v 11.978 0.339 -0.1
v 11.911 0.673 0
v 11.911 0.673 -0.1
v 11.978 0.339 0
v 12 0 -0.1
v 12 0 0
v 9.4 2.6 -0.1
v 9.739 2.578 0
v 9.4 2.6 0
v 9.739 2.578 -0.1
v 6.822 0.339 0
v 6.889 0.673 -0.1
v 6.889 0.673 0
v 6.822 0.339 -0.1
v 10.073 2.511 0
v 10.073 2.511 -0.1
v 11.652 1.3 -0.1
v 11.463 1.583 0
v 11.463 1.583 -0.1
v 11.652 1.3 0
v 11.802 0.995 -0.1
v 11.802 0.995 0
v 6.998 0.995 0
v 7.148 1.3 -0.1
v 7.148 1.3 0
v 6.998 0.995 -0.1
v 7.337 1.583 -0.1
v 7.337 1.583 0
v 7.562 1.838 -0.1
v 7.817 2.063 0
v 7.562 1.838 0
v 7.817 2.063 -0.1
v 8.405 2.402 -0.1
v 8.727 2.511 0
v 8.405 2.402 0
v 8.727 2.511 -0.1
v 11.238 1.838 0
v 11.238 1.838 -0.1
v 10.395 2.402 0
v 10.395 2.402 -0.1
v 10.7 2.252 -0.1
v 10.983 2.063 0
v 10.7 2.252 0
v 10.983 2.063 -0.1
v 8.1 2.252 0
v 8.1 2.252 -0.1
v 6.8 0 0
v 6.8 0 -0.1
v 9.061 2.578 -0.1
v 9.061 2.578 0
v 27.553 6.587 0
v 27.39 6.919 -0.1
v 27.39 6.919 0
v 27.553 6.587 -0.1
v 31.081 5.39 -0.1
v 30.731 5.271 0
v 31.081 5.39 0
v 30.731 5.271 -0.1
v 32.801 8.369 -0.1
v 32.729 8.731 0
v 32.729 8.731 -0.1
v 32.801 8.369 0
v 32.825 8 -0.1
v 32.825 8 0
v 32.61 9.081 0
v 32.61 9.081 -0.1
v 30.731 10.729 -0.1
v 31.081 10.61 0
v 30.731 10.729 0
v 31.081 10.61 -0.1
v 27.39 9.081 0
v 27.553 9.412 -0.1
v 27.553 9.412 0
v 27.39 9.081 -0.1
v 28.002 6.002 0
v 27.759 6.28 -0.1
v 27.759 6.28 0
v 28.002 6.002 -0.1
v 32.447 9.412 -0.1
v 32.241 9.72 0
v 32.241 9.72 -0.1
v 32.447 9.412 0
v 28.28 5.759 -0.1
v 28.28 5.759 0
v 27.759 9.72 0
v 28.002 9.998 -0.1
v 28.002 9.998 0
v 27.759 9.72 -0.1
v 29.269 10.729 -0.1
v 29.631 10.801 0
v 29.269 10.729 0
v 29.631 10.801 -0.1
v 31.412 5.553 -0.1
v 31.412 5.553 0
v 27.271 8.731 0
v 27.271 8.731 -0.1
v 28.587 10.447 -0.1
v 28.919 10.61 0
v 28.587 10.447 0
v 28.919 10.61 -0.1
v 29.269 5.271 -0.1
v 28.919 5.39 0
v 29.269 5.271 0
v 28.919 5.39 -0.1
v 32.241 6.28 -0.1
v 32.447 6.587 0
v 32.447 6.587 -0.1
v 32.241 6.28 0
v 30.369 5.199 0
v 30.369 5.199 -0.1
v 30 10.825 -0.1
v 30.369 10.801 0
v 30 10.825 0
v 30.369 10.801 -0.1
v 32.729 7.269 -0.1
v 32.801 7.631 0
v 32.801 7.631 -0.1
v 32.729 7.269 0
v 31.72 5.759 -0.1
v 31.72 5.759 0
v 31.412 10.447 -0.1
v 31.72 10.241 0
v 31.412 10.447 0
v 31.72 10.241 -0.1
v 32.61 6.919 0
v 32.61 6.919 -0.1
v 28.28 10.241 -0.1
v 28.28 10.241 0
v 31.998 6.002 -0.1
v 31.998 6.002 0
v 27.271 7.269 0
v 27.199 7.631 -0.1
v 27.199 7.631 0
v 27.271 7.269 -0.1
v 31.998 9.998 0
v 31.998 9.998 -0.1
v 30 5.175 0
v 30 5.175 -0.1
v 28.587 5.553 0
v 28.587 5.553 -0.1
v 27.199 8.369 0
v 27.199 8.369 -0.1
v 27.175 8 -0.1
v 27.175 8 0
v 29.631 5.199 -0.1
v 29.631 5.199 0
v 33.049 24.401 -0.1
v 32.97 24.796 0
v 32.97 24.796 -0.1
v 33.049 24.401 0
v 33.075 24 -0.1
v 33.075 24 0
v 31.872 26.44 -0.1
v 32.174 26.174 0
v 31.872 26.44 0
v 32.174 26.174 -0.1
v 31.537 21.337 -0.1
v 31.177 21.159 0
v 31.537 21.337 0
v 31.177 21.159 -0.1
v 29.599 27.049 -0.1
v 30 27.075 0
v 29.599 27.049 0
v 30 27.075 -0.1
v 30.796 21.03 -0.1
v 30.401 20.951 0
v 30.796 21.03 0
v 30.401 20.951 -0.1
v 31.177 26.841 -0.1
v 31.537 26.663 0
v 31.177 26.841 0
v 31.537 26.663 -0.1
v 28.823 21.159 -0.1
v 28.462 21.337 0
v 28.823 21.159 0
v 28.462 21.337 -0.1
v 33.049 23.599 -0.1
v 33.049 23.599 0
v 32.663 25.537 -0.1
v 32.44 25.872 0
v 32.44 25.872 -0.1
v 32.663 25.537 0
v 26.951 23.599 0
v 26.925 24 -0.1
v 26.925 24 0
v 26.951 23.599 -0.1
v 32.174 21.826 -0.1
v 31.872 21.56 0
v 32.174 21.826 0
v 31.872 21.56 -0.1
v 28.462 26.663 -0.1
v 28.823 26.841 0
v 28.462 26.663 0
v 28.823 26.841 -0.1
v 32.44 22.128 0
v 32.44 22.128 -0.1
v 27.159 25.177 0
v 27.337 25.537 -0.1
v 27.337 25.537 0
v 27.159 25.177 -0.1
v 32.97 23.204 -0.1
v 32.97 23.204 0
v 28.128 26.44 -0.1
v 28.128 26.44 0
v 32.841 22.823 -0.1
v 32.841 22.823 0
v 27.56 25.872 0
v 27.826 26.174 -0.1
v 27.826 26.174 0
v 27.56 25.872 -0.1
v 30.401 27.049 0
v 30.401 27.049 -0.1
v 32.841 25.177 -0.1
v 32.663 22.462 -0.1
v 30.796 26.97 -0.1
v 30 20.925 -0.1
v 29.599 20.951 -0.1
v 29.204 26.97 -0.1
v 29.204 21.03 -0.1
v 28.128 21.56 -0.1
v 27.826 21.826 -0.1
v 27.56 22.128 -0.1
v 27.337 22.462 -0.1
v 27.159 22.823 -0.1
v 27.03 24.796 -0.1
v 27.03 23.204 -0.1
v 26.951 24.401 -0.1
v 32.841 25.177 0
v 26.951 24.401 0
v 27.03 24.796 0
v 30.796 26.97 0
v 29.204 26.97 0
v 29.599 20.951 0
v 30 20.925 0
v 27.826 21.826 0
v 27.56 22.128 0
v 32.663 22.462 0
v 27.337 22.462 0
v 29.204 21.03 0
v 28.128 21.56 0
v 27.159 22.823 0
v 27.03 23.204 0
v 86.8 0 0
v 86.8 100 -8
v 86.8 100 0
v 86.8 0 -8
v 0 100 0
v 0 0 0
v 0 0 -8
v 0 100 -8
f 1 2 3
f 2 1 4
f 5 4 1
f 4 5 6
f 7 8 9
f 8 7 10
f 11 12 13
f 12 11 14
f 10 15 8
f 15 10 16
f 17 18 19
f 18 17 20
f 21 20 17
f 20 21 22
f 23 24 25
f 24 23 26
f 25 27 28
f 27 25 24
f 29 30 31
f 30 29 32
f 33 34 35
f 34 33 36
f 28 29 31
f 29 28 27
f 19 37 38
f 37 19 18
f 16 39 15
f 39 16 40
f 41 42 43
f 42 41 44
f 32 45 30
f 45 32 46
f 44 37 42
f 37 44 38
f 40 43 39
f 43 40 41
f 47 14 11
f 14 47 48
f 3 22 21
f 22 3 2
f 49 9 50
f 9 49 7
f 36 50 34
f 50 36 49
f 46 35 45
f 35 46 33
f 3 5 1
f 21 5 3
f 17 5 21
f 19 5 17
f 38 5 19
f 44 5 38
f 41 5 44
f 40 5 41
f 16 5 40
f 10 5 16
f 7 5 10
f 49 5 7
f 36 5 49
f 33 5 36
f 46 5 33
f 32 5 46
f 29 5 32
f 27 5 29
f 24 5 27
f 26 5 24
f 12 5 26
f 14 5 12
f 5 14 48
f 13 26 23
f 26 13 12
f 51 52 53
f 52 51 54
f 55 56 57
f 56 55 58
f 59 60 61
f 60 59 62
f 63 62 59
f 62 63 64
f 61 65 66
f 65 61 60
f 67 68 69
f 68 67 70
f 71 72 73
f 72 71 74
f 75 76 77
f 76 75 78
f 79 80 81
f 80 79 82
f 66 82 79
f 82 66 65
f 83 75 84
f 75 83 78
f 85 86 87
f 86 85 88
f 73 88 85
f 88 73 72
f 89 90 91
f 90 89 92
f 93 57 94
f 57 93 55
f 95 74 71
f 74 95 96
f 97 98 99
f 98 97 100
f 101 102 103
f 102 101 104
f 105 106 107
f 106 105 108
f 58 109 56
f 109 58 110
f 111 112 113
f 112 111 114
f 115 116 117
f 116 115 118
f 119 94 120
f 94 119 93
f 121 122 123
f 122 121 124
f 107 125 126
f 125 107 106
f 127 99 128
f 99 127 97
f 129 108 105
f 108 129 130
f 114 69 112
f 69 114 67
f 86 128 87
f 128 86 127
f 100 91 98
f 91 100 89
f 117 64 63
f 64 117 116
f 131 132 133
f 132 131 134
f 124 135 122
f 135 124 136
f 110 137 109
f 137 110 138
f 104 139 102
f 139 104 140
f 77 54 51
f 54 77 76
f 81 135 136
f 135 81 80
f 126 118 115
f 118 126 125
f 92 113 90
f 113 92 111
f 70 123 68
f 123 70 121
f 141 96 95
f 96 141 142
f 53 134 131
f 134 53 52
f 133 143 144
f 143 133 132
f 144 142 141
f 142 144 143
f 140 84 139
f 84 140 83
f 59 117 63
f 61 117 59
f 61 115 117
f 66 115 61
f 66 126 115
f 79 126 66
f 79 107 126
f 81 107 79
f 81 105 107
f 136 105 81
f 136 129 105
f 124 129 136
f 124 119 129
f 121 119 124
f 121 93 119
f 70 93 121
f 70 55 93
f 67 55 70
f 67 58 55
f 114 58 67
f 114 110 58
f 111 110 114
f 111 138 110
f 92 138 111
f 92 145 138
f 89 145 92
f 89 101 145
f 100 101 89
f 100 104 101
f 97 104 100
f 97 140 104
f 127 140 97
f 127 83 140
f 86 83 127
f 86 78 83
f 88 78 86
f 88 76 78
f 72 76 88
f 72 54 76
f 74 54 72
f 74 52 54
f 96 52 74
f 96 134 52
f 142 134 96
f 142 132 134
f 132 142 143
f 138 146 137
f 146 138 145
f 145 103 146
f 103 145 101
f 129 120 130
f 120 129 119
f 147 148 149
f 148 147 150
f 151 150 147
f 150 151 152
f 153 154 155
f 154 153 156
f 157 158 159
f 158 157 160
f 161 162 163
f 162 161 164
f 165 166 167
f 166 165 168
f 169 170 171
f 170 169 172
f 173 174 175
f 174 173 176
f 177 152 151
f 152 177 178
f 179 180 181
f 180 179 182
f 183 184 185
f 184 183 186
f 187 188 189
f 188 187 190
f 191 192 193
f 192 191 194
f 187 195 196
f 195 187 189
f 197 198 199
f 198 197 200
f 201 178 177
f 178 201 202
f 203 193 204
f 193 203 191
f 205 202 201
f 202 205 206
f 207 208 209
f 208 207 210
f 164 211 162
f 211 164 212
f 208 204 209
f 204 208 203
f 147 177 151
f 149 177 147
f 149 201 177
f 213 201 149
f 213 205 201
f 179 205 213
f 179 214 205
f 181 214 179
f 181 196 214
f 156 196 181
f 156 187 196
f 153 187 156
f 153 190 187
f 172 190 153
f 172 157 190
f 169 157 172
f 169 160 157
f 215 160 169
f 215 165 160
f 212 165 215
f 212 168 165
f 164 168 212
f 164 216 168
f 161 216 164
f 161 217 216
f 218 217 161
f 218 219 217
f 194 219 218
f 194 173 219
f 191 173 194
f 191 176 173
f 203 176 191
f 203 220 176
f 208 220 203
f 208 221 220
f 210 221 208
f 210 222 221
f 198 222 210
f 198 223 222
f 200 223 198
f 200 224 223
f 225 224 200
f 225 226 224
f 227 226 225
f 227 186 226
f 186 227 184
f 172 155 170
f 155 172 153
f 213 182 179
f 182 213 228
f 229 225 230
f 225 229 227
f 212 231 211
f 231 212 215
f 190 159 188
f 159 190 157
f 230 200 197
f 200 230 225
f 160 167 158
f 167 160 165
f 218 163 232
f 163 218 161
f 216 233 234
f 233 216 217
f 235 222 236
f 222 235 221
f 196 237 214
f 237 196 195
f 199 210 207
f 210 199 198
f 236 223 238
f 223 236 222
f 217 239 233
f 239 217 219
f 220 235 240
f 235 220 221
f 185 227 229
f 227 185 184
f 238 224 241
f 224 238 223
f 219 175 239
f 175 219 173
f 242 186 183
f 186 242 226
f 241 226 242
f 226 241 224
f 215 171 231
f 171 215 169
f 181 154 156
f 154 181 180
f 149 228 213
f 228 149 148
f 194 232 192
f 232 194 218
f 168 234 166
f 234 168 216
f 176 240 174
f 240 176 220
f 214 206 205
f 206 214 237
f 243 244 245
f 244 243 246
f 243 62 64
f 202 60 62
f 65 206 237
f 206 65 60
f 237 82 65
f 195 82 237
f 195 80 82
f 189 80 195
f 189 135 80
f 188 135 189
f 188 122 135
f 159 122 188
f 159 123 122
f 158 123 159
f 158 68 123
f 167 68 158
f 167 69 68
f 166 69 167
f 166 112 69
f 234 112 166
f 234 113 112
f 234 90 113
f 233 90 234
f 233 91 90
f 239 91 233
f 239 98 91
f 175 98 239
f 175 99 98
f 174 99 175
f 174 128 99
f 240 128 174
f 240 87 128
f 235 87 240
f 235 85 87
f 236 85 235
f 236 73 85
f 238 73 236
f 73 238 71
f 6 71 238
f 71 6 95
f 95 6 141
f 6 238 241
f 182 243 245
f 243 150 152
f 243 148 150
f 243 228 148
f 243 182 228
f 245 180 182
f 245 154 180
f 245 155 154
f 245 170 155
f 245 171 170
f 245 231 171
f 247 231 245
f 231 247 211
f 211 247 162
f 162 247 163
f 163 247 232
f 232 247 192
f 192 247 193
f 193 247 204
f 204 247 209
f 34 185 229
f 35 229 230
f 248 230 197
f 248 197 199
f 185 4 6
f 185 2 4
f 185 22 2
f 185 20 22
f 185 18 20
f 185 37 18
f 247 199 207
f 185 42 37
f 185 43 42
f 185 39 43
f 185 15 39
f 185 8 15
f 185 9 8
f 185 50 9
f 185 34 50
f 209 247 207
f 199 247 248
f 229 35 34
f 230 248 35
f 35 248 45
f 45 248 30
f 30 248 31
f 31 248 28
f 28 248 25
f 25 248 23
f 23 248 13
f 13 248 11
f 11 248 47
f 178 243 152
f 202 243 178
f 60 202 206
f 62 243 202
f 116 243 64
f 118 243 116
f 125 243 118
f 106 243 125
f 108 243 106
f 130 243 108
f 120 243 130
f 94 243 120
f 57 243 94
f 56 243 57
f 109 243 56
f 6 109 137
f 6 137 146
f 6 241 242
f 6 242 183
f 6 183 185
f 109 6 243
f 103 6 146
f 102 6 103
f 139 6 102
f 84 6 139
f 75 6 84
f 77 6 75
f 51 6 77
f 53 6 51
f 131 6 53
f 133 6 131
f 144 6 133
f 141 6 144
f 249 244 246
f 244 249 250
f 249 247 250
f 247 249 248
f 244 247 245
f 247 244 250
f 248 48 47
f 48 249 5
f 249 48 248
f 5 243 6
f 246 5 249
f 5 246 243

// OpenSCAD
// CONJOIN CJWP12 water pump GAUGE (Jig 21)
// =============================================================================
// Fit-check for the BOM robot-side "Water pump" = CONJOIN CJWP12 (BOM.md L64,
// commit 0dfb117, 2026-08-24), modelled in
// cjwp12-water-pump/cjwp12-water-pump.scad.
// One plate, three checks:
//   A — HEAD cross-section SLOT: a 21 x 12 mm through-slot (per the Conjoin
//       datasheet "Pump head dimensions: 21*12mm"). The pump head face must
//       drop through. Verifies head_len x head_wid.
//   B — BARB PAIR-PITCH bores: two bores spaced barb_pitch apart that BOTH
//       barb tips must drop into simultaneously. Verifies barb_pitch + barb_od
//       together — THE critical dim for a printed manifold / tubing restraint.
//   C — BARB-OD go/no-go bores (O4.5 / 5 / 5.5 / 6 mm nominal): drop each
//       barb tip in; the largest bore it falls through identifies the barb OD
//       class for tubing selection (BOM cites "tube 2mm ID 4mm OD", implying a
//       ~4.5-4.8 mm barb — verify, do not assume).
//
// Keep these values in sync with cjwp12-water-pump.scad (provenance lives
// there + MEASURE-ME.md s22). Tune the clearances, never the part.
//
// Pass/fail + fail->fix mapping: PRINT-TEST.md Jig 21.
// License: CC BY-SA 4.0

$fn = 48;

/* [Pump params - mirror cjwp12-water-pump.scad] */
head_len    = 21.0;  // (datasheet: Conjoin "Pump head dimensions: 21*12mm")
head_wid    = 12.0;  // (datasheet: Conjoin "21*12mm")
barb_od     = 4.8;   // (estimate) from BOM tube 4mm OD class
barb_pitch  = 14.8;  // (OCR: Conjoin dwg "14.8+-0.3"; mapping (estimate)) CRITICAL

/* [Jig dimensions - EDIT] */
slot_clearance = 0.3;  // mm total - head slot = (head_len,head_wid) + this
barb_clearance = 0.4;  // mm DIAMETRAL - pair bores = barb_od + this
notch_noms     = [4.5, 5.0, 5.5, 6.0]; // mm candidate barb ODs (add/remove as found)
notch_clearance = 0.15;                // mm DIAMETRAL (go = nominal + this)

plate_t      = 8.0;   // mm base thickness (all pass-through bores/slots)
plate_margin = 8.0;   // mm margin around features

slot_w = head_len + slot_clearance;
slot_h = head_wid + slot_clearance;
barb_bore_d = barb_od + barb_clearance;
notch_ds = [for (n = notch_noms) n + notch_clearance];

// ===== GEOMETRY (origin = plate center xy, plate top at z = 0) =====
// Features left->right: head slot, barb-pair, go/no-go row.
head_x  = -24;
barbp_x = 2;
notch_x = 30;

plate_w = (notch_x - head_x) + max(notch_ds) + max(slot_w, barb_bore_d) / 2 + 2 * plate_margin;
plate_h = max(slot_h, barb_bore_d + barb_pitch) + len(notch_ds) * 16 + 2 * plate_margin;

module head_slot() {
    // Rectangular through-slot sized to the 21x12 head cross-section.
    translate([head_x, 0, -0.1])
        cube([slot_w, slot_h, plate_t + 0.2], center = true);
}

module barb_pair() {
    for (x = [-1, 1]) {
        translate([barbp_x + x * barb_pitch / 2, 0, -0.1])
            cylinder(h = plate_t + 0.2, r = barb_bore_d / 2);
    }
}

module notch_row() {
    for (i = [0:len(notch_ds)-1]) {
        y_off = (i - (len(notch_ds) - 1) / 2) * 16;
        translate([notch_x, y_off, -0.1])
            cylinder(h = plate_t + 0.2, r = notch_ds[i] / 2);
    }
}

module jig_plate() {
    // Plate top face at z=0, thickness below (matches house jig convention)
    translate([0, 0, -plate_t])
        cube([plate_w, plate_h, plate_t]);
}

difference() {
    jig_plate();
    head_slot();
    barb_pair();
    notch_row();
}
